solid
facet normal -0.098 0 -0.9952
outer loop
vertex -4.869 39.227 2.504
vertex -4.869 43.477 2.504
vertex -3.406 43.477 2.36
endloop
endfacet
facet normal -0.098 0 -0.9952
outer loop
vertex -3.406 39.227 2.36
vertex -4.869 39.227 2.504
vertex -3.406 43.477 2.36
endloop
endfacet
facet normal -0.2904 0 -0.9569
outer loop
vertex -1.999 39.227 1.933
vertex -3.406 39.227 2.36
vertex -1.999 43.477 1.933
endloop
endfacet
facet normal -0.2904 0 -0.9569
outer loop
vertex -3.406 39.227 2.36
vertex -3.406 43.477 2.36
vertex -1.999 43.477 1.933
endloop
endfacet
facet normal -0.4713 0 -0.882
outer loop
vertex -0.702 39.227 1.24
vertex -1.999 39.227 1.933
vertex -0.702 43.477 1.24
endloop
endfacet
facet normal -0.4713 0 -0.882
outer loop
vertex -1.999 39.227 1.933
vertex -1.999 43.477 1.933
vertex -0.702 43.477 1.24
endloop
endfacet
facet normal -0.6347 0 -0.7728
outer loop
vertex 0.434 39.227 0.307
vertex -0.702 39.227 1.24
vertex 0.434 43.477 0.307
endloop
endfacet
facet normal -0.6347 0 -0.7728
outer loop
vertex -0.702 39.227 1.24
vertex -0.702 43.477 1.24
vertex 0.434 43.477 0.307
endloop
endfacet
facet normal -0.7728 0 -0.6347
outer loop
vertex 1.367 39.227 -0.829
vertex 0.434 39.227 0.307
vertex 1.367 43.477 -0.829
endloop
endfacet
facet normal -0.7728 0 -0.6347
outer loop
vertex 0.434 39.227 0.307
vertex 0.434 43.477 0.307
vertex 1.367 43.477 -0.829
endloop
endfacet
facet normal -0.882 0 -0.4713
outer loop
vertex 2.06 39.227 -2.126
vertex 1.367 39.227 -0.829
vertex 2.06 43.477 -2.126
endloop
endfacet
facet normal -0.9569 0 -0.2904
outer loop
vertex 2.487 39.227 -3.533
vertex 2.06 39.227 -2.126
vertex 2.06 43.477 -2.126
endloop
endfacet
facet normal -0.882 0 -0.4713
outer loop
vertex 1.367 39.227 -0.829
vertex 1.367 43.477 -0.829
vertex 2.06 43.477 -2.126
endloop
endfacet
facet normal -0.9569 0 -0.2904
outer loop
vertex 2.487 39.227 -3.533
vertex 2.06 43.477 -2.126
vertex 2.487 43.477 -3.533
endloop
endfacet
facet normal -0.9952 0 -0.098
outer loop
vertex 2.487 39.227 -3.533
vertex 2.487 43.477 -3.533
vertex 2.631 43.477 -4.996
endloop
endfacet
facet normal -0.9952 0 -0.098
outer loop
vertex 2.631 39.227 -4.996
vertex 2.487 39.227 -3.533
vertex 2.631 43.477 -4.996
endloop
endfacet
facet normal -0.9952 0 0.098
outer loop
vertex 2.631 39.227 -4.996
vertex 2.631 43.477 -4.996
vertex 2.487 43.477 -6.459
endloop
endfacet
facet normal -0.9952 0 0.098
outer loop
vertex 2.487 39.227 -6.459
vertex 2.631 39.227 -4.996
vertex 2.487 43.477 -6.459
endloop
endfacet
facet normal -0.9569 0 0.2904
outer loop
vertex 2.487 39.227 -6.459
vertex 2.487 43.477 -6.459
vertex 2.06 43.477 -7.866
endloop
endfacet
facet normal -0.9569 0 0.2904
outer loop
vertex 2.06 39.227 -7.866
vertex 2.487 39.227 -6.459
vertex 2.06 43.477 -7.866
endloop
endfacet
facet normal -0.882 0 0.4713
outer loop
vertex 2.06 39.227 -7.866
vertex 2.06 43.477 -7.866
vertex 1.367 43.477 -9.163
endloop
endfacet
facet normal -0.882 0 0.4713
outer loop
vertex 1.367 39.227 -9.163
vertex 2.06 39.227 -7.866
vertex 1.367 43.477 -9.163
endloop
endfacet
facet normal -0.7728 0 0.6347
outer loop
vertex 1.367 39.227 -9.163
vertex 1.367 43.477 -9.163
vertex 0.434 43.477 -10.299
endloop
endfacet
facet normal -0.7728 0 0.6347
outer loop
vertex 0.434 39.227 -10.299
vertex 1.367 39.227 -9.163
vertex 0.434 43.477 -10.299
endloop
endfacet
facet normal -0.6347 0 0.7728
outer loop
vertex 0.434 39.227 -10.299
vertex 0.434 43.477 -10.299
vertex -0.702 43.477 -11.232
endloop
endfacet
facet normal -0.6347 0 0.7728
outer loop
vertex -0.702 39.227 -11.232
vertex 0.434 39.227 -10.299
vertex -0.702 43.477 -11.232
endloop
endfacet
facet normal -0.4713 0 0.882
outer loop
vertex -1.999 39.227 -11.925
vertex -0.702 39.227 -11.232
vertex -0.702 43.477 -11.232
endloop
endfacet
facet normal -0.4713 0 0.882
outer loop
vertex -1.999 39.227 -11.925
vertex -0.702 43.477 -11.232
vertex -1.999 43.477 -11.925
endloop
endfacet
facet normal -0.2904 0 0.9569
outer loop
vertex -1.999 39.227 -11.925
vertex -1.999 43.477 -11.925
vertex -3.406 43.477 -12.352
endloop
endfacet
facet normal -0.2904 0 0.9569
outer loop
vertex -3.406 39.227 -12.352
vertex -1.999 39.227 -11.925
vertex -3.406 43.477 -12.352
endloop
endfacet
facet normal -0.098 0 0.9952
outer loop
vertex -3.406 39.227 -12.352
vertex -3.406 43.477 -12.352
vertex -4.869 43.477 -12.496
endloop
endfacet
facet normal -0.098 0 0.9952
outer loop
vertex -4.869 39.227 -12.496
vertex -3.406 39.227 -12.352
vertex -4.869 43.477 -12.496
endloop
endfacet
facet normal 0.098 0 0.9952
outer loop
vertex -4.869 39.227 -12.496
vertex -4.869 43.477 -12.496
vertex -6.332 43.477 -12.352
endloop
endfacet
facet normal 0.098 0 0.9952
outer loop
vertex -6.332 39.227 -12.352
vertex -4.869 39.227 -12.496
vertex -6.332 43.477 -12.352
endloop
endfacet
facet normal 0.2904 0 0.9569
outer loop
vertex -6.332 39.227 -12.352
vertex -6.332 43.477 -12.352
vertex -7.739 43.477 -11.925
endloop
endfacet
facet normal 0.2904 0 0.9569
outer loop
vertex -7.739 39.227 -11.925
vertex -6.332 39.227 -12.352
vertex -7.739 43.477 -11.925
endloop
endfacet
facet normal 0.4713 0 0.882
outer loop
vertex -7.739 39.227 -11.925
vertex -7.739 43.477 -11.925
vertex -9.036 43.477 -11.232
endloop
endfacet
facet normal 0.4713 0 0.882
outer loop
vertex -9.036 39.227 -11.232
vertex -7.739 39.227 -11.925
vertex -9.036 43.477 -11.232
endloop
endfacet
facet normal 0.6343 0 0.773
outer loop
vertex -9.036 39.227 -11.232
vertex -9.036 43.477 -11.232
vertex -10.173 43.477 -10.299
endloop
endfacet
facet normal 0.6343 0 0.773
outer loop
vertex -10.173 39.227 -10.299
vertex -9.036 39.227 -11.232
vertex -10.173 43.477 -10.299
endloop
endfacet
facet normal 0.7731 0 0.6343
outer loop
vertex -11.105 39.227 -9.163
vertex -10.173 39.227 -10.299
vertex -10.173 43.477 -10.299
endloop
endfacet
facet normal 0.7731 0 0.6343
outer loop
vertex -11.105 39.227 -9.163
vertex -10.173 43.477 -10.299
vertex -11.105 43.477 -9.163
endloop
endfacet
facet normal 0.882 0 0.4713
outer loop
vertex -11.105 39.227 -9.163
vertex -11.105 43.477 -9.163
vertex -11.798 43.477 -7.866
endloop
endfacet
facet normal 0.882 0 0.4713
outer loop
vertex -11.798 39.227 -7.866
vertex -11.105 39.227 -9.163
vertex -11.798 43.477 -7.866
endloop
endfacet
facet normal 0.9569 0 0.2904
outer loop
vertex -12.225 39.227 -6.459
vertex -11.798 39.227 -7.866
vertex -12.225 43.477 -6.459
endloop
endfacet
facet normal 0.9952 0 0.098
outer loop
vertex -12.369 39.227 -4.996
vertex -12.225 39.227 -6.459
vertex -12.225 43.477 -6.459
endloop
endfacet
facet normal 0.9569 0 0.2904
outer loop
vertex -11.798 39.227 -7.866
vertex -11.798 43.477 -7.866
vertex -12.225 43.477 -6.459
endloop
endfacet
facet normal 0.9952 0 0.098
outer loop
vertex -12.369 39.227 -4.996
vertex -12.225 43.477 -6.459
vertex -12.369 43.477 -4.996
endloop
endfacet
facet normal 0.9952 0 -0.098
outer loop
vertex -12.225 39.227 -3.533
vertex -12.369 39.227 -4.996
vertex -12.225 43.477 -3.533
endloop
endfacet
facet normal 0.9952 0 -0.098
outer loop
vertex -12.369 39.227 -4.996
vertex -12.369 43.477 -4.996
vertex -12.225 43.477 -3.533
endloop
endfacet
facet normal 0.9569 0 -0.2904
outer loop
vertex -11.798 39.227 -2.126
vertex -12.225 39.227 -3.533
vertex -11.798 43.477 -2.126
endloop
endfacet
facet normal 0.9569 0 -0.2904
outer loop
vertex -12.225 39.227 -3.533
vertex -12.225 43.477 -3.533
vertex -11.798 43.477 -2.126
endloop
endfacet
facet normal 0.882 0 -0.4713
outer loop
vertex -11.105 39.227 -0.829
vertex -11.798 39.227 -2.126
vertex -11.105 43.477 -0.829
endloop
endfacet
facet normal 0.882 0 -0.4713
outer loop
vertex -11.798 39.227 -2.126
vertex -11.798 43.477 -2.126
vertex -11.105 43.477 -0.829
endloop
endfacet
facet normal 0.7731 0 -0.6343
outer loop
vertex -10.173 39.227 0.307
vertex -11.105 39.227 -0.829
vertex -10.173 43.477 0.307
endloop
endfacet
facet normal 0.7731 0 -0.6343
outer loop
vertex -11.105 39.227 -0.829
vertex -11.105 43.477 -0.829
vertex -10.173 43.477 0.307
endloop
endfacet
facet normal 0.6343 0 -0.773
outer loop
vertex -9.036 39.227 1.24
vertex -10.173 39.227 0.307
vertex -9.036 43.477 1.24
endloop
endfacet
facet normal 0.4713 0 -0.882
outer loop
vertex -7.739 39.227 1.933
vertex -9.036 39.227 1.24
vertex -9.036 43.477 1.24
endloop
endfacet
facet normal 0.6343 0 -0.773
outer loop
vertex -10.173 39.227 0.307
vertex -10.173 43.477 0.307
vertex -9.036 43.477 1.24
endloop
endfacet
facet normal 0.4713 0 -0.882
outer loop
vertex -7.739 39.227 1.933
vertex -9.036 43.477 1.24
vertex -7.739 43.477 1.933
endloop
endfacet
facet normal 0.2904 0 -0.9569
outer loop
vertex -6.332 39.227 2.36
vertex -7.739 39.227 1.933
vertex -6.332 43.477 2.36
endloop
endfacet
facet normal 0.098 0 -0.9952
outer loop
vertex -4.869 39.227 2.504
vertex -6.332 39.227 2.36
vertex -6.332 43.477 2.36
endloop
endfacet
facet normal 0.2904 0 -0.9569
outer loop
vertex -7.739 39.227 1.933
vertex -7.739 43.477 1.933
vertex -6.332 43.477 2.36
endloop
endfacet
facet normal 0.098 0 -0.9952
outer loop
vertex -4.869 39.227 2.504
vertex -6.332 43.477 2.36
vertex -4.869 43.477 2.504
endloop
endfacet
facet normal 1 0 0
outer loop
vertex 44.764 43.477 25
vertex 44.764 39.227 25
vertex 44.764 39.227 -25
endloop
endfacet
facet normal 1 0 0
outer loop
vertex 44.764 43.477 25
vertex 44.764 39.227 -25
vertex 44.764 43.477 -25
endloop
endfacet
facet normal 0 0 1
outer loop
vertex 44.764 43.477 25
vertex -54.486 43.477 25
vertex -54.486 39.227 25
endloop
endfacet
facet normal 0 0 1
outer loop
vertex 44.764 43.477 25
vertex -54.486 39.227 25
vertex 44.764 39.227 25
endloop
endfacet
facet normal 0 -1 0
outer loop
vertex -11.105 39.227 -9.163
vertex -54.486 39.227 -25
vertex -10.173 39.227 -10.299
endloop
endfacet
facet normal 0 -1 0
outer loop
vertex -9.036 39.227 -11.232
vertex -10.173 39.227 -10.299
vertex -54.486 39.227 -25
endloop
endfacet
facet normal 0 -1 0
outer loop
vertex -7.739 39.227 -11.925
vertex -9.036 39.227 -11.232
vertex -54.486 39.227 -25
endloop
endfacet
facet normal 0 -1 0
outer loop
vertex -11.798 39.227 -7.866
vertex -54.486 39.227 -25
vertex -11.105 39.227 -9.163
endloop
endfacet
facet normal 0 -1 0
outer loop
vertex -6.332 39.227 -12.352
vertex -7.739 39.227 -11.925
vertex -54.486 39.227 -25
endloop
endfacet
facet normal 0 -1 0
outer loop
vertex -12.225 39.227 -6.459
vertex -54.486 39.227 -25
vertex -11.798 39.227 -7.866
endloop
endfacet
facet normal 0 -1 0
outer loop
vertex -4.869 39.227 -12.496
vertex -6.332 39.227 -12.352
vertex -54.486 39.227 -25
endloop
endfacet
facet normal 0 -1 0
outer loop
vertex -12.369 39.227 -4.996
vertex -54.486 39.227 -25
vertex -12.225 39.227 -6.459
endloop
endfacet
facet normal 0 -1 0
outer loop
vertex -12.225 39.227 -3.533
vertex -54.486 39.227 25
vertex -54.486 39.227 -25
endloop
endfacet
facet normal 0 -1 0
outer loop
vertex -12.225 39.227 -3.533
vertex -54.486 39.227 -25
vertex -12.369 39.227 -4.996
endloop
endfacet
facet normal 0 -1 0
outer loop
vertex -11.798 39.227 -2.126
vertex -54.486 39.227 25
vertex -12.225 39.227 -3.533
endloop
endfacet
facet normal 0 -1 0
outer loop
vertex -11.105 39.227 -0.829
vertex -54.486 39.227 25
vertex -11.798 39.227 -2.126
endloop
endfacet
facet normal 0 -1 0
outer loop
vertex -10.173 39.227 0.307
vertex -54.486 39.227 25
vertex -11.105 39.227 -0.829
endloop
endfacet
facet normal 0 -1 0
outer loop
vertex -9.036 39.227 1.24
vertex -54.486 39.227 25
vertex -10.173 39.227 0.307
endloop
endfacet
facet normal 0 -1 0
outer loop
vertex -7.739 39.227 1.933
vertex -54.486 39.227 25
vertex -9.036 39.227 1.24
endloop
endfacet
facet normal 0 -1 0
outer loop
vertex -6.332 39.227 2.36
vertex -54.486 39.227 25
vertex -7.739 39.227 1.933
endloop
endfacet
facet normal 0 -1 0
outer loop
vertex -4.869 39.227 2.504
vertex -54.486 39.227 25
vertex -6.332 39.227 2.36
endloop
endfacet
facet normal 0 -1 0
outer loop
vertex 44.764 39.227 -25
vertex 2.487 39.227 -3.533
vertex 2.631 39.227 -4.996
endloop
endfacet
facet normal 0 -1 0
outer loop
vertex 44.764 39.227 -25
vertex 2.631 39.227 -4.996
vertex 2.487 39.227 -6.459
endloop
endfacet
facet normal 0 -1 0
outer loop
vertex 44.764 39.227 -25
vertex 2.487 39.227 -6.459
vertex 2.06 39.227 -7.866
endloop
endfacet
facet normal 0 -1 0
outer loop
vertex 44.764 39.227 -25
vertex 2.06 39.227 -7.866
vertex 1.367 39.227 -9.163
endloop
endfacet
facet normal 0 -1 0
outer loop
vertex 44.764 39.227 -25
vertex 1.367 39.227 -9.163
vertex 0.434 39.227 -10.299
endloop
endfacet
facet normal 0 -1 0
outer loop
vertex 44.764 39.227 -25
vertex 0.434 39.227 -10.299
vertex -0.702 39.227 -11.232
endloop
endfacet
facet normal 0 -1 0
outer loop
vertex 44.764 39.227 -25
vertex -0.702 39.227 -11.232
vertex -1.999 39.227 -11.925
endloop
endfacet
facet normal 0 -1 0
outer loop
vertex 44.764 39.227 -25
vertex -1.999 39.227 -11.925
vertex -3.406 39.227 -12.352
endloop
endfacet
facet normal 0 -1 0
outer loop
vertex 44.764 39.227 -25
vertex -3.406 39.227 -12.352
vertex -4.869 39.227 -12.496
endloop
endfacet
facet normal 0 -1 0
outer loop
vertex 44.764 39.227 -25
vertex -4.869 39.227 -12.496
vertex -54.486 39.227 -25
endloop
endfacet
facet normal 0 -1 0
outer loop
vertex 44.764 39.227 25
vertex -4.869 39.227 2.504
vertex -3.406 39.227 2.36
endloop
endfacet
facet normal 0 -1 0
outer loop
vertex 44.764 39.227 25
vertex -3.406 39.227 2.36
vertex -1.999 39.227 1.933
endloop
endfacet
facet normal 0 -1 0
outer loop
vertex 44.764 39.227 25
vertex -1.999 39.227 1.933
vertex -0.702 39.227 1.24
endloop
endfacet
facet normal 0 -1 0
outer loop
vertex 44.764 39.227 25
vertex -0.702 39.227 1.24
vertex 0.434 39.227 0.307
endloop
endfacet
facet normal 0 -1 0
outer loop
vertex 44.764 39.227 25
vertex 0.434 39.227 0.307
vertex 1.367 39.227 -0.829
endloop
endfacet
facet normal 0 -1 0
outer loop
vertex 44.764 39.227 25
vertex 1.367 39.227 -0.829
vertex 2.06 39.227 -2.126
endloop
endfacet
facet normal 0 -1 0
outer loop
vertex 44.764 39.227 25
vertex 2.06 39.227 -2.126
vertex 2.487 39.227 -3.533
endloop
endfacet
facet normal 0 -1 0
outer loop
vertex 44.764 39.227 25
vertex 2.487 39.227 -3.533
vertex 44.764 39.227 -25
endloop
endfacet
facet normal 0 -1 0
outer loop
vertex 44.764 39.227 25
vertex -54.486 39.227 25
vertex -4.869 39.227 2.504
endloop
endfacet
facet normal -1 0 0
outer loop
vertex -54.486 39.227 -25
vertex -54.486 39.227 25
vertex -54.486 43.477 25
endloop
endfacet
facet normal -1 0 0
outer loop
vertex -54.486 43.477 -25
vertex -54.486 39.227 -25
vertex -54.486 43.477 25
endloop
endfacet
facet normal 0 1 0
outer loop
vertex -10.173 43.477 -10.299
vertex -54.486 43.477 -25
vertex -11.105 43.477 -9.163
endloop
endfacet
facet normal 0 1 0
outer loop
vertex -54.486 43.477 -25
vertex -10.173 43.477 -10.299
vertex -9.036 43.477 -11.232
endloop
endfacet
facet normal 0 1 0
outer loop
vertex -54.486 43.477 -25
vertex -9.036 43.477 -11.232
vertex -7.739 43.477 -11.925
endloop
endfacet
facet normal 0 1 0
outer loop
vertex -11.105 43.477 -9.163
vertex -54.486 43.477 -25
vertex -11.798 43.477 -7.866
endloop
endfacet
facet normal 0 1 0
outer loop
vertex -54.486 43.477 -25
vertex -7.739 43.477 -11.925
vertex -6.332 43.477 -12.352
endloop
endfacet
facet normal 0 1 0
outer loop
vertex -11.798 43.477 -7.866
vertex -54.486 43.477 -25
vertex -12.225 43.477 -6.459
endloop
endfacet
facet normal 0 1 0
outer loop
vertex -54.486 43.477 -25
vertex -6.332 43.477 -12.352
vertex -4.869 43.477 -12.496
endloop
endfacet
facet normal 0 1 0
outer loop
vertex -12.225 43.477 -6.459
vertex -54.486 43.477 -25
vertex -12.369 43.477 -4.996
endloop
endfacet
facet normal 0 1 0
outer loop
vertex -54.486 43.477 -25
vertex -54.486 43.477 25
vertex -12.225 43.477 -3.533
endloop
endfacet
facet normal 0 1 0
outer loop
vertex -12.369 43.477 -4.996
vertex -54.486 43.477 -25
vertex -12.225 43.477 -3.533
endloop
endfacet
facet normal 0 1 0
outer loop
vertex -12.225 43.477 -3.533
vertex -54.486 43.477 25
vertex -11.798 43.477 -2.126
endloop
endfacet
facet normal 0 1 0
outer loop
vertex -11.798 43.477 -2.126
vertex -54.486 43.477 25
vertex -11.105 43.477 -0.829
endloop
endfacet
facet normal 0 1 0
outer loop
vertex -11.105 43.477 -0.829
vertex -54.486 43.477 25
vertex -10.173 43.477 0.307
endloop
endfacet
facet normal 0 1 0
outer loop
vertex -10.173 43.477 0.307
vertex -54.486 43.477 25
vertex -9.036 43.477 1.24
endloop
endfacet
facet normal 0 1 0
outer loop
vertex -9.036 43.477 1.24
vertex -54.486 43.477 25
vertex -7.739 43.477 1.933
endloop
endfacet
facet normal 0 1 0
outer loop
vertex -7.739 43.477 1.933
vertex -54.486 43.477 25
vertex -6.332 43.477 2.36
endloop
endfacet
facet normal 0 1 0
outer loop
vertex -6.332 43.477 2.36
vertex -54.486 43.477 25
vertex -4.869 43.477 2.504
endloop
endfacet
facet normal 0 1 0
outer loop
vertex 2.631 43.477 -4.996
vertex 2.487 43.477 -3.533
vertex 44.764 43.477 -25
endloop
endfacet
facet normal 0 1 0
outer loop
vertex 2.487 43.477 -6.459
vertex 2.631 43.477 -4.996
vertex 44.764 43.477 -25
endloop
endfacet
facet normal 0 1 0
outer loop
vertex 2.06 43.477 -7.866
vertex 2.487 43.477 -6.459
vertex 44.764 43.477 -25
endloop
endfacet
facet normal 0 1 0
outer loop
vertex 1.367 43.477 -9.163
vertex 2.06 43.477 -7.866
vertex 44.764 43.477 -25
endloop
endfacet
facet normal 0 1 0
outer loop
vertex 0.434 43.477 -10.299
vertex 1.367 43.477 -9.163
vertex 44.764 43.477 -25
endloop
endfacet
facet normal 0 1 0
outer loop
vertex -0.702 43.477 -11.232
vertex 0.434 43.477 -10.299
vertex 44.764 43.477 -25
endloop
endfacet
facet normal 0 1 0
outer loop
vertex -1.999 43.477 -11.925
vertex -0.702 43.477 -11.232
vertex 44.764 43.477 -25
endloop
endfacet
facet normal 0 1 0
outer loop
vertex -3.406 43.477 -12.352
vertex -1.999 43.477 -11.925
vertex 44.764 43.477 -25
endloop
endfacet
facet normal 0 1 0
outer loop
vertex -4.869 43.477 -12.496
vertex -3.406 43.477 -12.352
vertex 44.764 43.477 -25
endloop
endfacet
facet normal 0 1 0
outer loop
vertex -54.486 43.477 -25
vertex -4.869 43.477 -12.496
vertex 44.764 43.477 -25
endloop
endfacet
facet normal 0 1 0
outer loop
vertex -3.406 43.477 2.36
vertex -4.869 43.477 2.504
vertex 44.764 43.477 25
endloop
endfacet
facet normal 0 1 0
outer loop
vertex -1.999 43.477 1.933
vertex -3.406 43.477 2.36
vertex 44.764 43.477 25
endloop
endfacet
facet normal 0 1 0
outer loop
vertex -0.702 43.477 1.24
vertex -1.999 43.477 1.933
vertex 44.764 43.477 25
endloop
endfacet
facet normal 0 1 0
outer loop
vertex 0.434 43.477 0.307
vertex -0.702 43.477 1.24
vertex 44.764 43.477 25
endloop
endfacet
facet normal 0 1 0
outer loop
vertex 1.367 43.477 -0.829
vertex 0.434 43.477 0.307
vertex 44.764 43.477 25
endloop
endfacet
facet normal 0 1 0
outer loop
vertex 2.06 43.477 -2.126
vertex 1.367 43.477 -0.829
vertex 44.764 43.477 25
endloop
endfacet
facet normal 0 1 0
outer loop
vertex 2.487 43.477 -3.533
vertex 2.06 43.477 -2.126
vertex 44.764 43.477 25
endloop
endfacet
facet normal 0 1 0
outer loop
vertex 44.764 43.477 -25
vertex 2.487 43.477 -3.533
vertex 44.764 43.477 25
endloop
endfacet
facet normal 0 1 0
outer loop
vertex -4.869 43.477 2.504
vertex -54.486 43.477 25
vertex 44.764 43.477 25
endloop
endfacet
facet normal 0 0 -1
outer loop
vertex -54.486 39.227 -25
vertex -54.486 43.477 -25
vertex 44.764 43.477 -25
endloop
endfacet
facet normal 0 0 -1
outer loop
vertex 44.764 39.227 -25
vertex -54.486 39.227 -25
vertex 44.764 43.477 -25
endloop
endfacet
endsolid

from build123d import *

# Parameters (mm, degrees)
SKETCH1_W           = 99.25
SKETCH1_H           = 4.25
BOSS_EXTRUDE1_DEPTH = 25
CUT_EXTRUDE1_START  = 43.476884
SKETCH2_R           = 7.5
CUT_EXTRUDE1_DEPTH  = 6


with BuildPart() as part:
    # Sketch1 → Boss-Extrude1 (new, symmetric)
    with BuildSketch(Plane.XY):
        with Locations((-4.860782361, 41.351884068)):
            Rectangle(SKETCH1_W, SKETCH1_H)
    extrude(amount=BOSS_EXTRUDE1_DEPTH, both=True)

    # Sketch2 → Cut-Extrude1 (cut)
    with BuildSketch(Plane(origin=(0, 0, 0), x_dir=(1, 0, 0), z_dir=(0, 1, 0)).offset(CUT_EXTRUDE1_START)):
        with Locations(Location((-4.869275063, 4.996031553, 0), (0, 0, 270))):
            Circle(SKETCH2_R)
    extrude(amount=-CUT_EXTRUDE1_DEPTH, mode=Mode.SUBTRACT)


solid = part.part
